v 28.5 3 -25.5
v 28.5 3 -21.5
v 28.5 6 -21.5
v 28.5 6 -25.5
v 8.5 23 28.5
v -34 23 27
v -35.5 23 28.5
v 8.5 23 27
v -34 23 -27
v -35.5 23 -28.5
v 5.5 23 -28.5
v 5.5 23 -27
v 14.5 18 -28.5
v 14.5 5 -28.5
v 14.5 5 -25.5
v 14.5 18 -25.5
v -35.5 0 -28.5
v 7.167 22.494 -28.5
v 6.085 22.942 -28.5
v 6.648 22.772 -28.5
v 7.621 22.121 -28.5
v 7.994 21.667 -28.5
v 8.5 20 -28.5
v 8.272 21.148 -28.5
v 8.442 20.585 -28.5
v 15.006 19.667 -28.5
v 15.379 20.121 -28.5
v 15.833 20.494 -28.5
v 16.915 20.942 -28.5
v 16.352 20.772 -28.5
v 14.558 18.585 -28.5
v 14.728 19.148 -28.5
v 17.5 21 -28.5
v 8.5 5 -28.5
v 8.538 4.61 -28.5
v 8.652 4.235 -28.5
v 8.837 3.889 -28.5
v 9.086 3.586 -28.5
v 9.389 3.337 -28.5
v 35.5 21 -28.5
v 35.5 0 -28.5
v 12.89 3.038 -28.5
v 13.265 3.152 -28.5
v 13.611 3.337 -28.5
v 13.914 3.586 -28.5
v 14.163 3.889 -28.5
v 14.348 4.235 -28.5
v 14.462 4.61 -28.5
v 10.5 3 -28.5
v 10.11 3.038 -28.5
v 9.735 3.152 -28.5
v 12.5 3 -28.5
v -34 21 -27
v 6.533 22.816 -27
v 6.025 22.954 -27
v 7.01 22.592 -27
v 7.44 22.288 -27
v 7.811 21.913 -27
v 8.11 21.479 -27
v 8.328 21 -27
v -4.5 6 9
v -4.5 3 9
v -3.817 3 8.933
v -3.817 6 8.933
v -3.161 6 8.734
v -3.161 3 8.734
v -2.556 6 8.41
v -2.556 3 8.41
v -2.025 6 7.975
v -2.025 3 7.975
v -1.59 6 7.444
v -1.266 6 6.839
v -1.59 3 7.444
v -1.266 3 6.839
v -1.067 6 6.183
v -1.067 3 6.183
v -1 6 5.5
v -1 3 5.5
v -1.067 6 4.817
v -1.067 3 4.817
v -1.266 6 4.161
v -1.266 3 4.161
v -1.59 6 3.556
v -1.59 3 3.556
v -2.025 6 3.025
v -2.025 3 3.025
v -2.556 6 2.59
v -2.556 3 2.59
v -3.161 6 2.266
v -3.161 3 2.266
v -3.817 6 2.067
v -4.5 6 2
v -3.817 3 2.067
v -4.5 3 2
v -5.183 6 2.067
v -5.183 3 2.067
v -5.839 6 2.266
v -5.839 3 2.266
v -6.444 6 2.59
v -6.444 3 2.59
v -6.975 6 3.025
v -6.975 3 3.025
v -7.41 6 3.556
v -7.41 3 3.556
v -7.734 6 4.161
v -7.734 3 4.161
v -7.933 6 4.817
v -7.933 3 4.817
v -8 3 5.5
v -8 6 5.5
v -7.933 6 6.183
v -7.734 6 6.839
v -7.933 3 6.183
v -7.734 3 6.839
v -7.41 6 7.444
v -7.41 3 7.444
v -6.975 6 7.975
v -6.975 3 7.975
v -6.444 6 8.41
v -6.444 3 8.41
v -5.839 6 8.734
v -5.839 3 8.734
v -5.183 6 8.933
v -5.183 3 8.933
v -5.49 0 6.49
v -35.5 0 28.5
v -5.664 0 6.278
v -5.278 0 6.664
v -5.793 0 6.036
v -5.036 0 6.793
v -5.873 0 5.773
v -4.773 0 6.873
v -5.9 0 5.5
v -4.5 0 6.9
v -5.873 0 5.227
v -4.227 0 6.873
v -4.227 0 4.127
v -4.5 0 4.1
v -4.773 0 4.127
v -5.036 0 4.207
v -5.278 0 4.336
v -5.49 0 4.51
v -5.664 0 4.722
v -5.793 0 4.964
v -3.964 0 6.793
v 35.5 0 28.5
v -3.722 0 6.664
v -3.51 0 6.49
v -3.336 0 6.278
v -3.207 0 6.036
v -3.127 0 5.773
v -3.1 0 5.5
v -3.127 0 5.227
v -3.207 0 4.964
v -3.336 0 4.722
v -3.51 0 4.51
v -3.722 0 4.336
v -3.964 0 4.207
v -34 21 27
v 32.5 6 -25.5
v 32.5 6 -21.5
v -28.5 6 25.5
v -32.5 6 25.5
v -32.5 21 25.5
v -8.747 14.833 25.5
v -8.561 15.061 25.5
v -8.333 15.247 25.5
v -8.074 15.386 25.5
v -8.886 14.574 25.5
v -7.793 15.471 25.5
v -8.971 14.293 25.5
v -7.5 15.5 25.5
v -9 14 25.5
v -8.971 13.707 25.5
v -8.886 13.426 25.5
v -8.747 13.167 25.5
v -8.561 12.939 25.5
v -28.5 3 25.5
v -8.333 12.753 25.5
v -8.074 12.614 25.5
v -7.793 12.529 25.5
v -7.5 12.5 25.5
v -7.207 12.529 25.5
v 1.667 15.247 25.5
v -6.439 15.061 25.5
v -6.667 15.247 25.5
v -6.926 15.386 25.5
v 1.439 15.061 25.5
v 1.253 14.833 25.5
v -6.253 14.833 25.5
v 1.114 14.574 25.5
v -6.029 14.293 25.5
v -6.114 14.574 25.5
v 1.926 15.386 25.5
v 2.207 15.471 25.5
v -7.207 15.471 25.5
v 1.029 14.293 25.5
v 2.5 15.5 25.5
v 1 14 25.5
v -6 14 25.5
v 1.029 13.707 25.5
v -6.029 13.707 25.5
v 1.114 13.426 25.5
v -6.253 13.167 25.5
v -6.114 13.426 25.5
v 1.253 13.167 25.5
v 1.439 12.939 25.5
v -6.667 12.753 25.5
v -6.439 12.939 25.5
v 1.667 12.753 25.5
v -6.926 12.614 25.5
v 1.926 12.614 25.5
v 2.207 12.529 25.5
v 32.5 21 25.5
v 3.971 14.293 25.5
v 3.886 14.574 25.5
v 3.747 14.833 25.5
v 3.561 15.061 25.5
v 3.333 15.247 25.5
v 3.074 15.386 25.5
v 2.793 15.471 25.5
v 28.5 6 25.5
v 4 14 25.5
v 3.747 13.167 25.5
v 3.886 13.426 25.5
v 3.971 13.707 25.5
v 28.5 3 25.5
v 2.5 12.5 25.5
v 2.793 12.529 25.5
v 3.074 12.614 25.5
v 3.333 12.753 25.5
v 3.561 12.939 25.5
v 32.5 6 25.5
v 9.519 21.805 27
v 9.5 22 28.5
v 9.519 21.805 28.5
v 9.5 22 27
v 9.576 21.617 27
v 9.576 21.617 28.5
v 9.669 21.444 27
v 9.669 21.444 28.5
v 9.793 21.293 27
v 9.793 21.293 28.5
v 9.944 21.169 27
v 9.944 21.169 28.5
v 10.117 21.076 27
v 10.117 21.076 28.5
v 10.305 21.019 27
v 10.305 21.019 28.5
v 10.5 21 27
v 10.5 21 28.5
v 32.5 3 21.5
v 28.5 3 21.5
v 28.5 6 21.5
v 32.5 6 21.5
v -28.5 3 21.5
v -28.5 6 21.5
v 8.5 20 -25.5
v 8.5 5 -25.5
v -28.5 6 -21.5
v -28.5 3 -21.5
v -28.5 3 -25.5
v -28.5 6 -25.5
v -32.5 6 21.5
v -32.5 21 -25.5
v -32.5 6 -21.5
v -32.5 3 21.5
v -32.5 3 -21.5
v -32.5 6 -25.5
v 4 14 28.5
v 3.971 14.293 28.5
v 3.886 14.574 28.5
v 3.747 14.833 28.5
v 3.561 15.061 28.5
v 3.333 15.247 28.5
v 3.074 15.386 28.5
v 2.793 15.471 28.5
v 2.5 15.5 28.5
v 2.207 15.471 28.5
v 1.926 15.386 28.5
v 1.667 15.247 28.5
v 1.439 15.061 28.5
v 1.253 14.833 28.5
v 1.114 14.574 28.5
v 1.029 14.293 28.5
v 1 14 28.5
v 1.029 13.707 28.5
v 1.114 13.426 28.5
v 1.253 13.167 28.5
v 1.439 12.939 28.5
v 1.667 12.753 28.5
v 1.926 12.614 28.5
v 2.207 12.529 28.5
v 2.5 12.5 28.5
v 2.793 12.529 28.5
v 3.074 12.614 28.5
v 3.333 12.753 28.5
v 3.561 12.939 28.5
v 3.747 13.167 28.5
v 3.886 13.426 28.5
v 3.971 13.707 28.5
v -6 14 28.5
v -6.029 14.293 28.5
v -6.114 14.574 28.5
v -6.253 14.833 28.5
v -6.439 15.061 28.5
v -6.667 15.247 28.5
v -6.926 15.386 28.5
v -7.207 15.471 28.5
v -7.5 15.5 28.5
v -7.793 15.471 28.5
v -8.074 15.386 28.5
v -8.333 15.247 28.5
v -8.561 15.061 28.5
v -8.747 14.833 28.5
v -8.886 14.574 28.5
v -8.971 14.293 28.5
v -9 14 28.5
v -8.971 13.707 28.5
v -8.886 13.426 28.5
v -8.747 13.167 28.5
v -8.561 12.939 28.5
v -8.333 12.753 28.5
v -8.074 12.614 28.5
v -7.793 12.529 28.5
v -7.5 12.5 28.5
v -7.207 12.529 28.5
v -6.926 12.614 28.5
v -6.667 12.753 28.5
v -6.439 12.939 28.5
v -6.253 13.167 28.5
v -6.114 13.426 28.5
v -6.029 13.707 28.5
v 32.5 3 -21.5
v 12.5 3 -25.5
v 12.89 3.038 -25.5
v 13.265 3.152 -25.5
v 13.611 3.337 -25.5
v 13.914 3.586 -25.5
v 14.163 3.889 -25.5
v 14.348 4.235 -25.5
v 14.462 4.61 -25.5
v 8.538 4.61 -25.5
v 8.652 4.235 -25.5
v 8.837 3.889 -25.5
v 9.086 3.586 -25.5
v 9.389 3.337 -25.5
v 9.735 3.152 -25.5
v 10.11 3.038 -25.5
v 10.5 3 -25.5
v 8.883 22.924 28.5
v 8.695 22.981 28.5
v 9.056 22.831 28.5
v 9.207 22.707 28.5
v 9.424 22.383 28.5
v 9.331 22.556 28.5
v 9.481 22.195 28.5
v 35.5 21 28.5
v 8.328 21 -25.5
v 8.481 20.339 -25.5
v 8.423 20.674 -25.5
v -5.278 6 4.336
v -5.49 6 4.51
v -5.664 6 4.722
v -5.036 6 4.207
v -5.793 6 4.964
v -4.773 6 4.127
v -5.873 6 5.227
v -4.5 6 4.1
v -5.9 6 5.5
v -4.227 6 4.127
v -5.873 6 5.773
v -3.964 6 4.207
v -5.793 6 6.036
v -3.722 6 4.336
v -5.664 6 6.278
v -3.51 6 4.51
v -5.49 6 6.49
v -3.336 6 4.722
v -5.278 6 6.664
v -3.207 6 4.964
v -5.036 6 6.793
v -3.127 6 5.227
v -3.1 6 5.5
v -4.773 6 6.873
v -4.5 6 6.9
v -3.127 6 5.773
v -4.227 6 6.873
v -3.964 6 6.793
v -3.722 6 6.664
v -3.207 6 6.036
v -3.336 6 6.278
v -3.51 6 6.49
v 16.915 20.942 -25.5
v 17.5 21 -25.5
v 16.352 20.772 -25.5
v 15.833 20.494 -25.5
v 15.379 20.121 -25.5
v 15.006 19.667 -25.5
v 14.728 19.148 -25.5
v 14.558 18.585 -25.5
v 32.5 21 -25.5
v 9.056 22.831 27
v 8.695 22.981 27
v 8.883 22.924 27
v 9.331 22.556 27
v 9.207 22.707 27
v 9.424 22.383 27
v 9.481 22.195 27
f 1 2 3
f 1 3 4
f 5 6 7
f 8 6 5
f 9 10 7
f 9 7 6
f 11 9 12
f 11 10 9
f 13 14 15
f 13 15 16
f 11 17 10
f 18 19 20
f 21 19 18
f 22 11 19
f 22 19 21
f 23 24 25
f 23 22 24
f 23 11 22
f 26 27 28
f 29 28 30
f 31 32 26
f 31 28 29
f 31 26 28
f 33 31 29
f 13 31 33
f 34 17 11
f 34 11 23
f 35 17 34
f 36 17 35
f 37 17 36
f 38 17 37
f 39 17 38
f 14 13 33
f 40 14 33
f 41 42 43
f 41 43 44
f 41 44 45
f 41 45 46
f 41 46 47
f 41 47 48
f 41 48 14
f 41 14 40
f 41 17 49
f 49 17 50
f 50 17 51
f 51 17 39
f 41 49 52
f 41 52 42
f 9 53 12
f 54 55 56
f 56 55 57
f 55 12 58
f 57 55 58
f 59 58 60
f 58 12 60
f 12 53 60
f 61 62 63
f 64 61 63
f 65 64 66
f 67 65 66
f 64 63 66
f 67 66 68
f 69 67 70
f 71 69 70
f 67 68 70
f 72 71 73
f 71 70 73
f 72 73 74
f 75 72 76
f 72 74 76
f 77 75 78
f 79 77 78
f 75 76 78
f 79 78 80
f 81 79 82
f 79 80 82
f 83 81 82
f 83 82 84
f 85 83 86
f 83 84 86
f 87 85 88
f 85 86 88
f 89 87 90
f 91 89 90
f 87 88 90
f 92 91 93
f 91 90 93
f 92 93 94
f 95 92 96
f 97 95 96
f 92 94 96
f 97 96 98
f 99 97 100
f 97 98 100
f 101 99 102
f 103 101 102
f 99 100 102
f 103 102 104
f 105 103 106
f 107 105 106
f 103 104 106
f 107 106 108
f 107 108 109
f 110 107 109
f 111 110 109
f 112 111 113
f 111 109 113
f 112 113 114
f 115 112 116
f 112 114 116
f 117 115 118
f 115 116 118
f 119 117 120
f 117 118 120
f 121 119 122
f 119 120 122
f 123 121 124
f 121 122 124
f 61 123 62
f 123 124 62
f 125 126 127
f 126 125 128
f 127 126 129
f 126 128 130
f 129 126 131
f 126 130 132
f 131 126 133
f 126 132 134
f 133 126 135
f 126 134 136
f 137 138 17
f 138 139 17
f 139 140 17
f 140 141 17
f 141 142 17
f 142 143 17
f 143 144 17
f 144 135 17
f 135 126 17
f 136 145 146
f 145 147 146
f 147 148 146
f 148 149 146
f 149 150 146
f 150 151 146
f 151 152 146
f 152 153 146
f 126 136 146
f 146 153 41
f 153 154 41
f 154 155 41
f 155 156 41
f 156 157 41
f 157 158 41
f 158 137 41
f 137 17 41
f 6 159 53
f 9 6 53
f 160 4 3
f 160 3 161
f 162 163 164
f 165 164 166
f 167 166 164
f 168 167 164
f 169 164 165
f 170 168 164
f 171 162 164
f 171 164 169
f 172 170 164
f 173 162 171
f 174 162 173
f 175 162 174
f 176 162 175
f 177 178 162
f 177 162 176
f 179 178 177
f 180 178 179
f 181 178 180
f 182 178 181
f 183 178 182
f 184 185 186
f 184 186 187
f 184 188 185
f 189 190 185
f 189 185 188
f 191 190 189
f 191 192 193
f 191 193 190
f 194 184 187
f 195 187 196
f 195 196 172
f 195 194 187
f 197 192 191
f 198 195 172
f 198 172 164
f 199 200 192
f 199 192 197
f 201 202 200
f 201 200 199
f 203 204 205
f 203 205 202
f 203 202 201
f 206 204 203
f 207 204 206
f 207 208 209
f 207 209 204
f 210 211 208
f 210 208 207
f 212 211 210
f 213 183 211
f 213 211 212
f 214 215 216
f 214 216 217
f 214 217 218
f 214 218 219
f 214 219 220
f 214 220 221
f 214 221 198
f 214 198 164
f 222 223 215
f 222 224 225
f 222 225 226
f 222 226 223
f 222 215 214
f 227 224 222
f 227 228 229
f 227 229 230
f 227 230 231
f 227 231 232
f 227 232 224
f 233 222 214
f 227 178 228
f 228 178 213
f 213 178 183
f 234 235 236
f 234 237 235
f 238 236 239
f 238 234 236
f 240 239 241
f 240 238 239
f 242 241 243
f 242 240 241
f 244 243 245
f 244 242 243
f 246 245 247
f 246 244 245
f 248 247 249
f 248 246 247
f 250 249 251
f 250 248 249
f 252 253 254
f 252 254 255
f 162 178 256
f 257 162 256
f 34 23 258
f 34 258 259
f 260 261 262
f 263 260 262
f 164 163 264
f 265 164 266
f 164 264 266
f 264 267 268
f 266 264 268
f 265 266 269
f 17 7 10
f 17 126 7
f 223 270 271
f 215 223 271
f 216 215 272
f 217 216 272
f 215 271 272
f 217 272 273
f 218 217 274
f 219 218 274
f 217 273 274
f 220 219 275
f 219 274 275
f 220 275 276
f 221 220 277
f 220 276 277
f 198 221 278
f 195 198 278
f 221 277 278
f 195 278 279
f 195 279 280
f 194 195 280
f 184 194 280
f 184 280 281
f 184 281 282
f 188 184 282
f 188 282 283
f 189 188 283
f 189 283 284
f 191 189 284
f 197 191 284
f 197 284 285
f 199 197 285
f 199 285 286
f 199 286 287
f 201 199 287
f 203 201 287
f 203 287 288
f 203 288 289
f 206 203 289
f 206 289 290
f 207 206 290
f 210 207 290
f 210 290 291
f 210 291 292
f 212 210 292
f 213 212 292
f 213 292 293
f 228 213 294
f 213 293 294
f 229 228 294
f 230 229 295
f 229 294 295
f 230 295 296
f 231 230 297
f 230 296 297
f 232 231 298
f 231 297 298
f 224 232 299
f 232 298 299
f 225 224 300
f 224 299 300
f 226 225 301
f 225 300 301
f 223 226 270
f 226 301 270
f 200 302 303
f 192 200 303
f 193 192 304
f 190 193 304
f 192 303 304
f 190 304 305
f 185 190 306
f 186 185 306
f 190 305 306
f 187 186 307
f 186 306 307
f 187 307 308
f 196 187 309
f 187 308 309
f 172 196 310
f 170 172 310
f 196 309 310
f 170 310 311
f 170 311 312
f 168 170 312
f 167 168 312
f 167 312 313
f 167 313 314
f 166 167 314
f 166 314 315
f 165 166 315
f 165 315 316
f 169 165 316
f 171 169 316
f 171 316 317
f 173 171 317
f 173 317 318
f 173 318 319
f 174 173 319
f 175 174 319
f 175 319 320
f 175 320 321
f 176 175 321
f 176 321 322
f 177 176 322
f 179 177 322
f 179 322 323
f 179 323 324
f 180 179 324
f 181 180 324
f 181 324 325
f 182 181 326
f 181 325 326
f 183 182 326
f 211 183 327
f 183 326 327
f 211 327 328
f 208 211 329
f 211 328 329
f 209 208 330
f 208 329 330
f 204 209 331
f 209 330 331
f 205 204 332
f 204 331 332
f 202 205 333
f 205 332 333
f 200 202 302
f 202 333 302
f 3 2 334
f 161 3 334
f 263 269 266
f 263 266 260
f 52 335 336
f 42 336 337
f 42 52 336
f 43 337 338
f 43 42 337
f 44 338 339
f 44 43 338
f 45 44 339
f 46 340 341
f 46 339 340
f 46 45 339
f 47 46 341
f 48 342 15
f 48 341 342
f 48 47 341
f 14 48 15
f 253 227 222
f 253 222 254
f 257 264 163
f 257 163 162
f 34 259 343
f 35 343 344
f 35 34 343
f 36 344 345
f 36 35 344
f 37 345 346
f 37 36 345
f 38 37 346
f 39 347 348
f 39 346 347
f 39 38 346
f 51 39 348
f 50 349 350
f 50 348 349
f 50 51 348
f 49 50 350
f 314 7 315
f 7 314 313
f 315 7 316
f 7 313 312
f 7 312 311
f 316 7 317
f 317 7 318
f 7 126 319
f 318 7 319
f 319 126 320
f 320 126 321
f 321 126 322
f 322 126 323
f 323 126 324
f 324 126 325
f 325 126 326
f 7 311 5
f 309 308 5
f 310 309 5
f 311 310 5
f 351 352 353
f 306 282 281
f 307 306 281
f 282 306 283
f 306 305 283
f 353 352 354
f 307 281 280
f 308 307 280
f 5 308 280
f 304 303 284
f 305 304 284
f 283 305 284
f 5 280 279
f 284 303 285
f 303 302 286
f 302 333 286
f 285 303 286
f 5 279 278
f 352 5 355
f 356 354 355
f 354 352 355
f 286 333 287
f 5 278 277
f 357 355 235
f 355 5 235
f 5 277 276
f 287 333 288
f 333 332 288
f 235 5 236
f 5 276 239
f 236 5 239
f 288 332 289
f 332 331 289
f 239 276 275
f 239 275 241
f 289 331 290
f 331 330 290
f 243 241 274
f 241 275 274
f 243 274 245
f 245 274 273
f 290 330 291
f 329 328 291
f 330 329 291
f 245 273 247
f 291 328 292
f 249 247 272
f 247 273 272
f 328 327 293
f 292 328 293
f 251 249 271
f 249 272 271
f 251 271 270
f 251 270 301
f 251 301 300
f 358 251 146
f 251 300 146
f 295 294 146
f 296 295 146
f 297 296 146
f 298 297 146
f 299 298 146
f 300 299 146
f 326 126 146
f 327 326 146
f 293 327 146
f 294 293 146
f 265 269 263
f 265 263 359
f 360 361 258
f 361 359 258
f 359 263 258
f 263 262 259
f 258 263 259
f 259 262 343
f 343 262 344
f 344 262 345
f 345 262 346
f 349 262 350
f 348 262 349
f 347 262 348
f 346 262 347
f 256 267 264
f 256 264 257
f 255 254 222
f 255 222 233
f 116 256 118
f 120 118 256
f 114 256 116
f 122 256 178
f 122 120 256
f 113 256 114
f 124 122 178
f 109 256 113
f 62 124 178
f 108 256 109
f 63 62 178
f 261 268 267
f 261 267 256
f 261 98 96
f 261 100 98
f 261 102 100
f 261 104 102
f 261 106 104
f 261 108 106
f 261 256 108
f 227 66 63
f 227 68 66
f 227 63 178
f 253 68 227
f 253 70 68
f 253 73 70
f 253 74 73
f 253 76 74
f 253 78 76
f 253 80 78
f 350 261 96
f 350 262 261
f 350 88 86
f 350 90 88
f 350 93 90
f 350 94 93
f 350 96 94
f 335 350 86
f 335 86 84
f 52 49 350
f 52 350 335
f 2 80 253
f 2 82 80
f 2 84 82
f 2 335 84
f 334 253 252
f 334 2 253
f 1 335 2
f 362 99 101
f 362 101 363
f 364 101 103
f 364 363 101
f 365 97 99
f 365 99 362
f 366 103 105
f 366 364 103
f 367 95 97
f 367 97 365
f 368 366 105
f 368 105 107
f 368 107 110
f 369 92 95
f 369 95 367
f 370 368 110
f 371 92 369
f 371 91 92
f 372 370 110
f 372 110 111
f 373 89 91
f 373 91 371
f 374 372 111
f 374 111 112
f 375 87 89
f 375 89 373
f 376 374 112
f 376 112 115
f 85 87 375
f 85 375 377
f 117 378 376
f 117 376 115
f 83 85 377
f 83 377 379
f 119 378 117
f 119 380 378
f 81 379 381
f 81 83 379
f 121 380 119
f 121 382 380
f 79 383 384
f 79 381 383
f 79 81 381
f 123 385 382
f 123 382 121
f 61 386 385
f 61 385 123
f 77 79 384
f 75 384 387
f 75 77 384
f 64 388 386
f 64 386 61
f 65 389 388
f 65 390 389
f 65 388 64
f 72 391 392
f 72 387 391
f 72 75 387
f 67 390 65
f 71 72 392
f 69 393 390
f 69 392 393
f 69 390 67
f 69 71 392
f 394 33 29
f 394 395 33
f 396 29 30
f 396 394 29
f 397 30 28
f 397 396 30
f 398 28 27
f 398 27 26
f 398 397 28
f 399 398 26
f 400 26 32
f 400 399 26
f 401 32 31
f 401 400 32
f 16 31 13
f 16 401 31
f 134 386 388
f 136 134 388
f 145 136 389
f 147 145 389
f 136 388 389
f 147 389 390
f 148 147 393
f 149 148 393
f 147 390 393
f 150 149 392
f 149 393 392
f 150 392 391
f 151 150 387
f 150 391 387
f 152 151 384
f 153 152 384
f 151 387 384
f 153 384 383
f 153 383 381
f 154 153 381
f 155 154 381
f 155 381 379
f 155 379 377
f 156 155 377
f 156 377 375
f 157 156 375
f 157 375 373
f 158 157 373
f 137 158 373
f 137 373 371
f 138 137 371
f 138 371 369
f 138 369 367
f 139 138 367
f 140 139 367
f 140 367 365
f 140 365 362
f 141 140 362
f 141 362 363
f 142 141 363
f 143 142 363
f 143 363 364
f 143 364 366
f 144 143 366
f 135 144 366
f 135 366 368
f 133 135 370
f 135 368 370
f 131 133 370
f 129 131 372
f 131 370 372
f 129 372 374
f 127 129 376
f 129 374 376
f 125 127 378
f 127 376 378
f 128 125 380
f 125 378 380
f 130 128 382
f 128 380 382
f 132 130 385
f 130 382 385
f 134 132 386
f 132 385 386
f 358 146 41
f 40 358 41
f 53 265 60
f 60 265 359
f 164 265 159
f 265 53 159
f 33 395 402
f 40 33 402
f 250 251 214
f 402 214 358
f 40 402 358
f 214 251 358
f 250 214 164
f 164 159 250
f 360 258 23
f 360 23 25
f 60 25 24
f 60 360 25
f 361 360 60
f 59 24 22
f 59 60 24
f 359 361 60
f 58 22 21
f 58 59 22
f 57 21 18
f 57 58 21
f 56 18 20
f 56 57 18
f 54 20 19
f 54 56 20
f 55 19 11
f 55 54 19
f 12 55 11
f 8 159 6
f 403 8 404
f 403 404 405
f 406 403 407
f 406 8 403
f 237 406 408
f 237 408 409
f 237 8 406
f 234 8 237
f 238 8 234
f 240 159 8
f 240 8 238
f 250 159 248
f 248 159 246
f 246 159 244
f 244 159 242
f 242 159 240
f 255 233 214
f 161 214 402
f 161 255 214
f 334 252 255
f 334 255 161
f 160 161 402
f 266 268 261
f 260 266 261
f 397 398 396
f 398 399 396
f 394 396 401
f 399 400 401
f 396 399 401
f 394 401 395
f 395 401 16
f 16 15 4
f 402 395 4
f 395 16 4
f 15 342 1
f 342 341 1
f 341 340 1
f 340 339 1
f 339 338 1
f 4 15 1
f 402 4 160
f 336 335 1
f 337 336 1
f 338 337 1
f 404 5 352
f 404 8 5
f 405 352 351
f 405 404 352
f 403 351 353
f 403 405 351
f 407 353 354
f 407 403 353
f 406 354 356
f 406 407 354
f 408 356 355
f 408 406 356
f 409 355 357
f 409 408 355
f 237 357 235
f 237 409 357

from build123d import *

# Parameters (mm, degrees)
SKETCH1_W           = 71
SKETCH1_H           = 57
BOSS_EXTRUDE1_DEPTH = 3
SKETCH2_W           = 71
SKETCH2_H           = 57
SKETCH2_W_2         = 65
SKETCH2_H_2         = 51
BOSS_EXTRUDE2_DEPTH = 18
SKETCH3_W           = 4
SKETCH3_H           = 4
BOSS_EXTRUDE3_DEPTH = 3
SKETCH4_R           = 3.5
BOSS_EXTRUDE4_DEPTH = 3
CUT_EXTRUDE1_REACH  = 49.932
SKETCH5_R           = 1.4
SKETCH6_W           = 71
SKETCH6_H           = 57
SKETCH6_W_2         = 68
SKETCH6_H_2         = 54
BOSS_EXTRUDE5_DEPTH = 2
SKETCH7_W           = 26
SKETCH7_H           = 2
CUT_EXTRUDE2_DEPTH  = 71.980631161
FILLET1_R           = 1
CUT_EXTRUDE3_REACH  = 72.981
FILLET2_R           = 3
FILLET3_R           = 3
CUT_EXTRUDE4_REACH  = 72.981
SKETCH9_R           = 1.5


with BuildPart() as part:
    # Sketch1 → Boss-Extrude1 (new body)
    with BuildSketch(Plane(origin=(0, 0, 0), x_dir=(1, 0, 0), z_dir=(0, 1, 0))):
        Rectangle(SKETCH1_W, SKETCH1_H)
    extrude(amount=BOSS_EXTRUDE1_DEPTH)

    # Sketch2 → Boss-Extrude2 (add)
    with BuildSketch(Plane(origin=(0, 3, 0), x_dir=(1, 0, 0), z_dir=(0, 1, 0))):
        Rectangle(SKETCH2_W, SKETCH2_H)
        Rectangle(SKETCH2_W_2, SKETCH2_H_2, mode=Mode.SUBTRACT)
    extrude(amount=BOSS_EXTRUDE2_DEPTH)

    # Sketch3 → Boss-Extrude3 (add)
    with BuildSketch(Plane(origin=(0, 3, 0), x_dir=(1, 0, 0), z_dir=(0, 1, 0))):
        with Locations((-30.5, 23.5)):
            Rectangle(SKETCH3_W, SKETCH3_H)
        with Locations((30.5, 23.5)):
            Rectangle(SKETCH3_W, SKETCH3_H)
        with Locations((30.5, -23.5)):
            Rectangle(SKETCH3_W, SKETCH3_H)
        with Locations((-30.5, -23.5)):
            Rectangle(SKETCH3_W, SKETCH3_H)
    extrude(amount=BOSS_EXTRUDE3_DEPTH)

    # Sketch4 → Boss-Extrude4 (add)
    with BuildSketch(Plane(origin=(0, 3, 0), x_dir=(1, 0, 0), z_dir=(0, 1, 0))):
        with Locations(Location((-4.5, -5.5, 0), (0, 0, 270))):
            Circle(SKETCH4_R)
    extrude(amount=BOSS_EXTRUDE4_DEPTH)

    # Sketch5 → Cut-Extrude1 (cut, up to next)
    with BuildSketch(Plane(origin=(0, 6, 0), x_dir=(1, 0, 0), z_dir=(0, 1, 0)), mode=Mode.PRIVATE) as cut_extrude1_sk1:
        with Locations(Location((-4.5, -5.5, 0), (0, 0, 270))):
            Circle(SKETCH5_R)
    cut_extrude1_tool1 = extrude(cut_extrude1_sk1.sketch, amount=-CUT_EXTRUDE1_REACH, mode=Mode.PRIVATE) & part.part
    add(cut_extrude1_tool1.solids().sort_by_distance((-4.5, 6, 5.5))[0], mode=Mode.SUBTRACT)

    # Sketch6 → Boss-Extrude5 (add)
    with BuildSketch(Plane(origin=(0, 21, 0), x_dir=(1, 0, 0), z_dir=(0, 1, 0))):
        Rectangle(SKETCH6_W, SKETCH6_H)
        Rectangle(SKETCH6_W_2, SKETCH6_H_2, mode=Mode.SUBTRACT)
    extrude(amount=BOSS_EXTRUDE5_DEPTH)

    # Sketch7 → Cut-Extrude2 (cut, through all)
    with BuildSketch(Plane.XY.offset(28.5)):
        with Locations((22.5, 22)):
            Rectangle(SKETCH7_W, SKETCH7_H)
    extrude(amount=-CUT_EXTRUDE2_DEPTH, mode=Mode.SUBTRACT)

    # Fillet1
    fillet1_edges = [part.edges().sort_by_distance(p)[0] for p in [
        (9.5, 21, -27.75),
        (9.5, 21, 27.75),
    ]]
    fillet(fillet1_edges, radius=FILLET1_R)
    fillet1_2_edges = [part.edges().sort_by_distance(p)[0] for p in [
        (9.5, 23, -27.75),
        (9.5, 23, 27.75),
    ]]
    fillet(fillet1_2_edges, radius=FILLET1_R - 0.0001)  # a hair under: the kernel refuses the full size

    # Sketch8 → Cut-Extrude3 (cut, up to next)
    with BuildSketch(Plane(origin=(0, 0, -28.5), x_dir=(-1, 0, 0), z_dir=(0, 0, -1)), mode=Mode.PRIVATE) as cut_extrude3_sk1:
        with BuildLine():
            Line((-14.5, 23.871984023), (-8.5, 23.871984023))
            Line((-8.5, 23.871984023), (-8.5, 5))
            ThreePointArc((-8.5, 5), (-9.085786438, 3.585786438), (-10.5, 3))
            Line((-10.5, 3), (-12.5, 3))
            ThreePointArc((-12.5, 3), (-13.914213562, 3.585786438), (-14.5, 5))
            Line((-14.5, 5), (-14.5, 23.871984023))
        make_face()
    cut_extrude3_tool1 = extrude(cut_extrude3_sk1.sketch, amount=-CUT_EXTRUDE3_REACH, mode=Mode.PRIVATE) & part.part
    add(cut_extrude3_tool1.solids().sort_by_distance((11.5, 13.574839, -28.5))[0], mode=Mode.SUBTRACT)

    # Fillet2
    fillet2_edges = [part.edges().sort_by_distance(p)[0] for p in [
        (14.5, 21, -27),
    ]]
    fillet(fillet2_edges, radius=FILLET2_R)

    # Fillet3
    fillet3_edges = [part.edges().sort_by_distance(p)[0] for p in [
        (8.5, 23, -27.75),
    ]]
    fillet(fillet3_edges, radius=FILLET3_R)

    # Sketch9 → Cut-Extrude4 (cut, up to next)
    with BuildSketch(Plane.XY.offset(28.5), mode=Mode.PRIVATE) as cut_extrude4_sk1:
        with Locations((2.5, 14)):
            Circle(SKETCH9_R)
    cut_extrude4_tool1 = extrude(cut_extrude4_sk1.sketch, amount=-CUT_EXTRUDE4_REACH, mode=Mode.PRIVATE) & part.part
    # Sketch9 → Cut-Extrude4 (cut, up to next)
    with BuildSketch(Plane.XY.offset(28.5), mode=Mode.PRIVATE) as cut_extrude4_sk2:
        with Locations((-7.5, 14)):
            Circle(SKETCH9_R)
    cut_extrude4_tool2 = extrude(cut_extrude4_sk2.sketch, amount=-CUT_EXTRUDE4_REACH, mode=Mode.PRIVATE) & part.part
    add(cut_extrude4_tool1.solids().sort_by_distance((2.5, 14, 28.5))[0], mode=Mode.SUBTRACT)
    add(cut_extrude4_tool2.solids().sort_by_distance((-7.5, 14, 28.5))[0], mode=Mode.SUBTRACT)


solid = part.part
